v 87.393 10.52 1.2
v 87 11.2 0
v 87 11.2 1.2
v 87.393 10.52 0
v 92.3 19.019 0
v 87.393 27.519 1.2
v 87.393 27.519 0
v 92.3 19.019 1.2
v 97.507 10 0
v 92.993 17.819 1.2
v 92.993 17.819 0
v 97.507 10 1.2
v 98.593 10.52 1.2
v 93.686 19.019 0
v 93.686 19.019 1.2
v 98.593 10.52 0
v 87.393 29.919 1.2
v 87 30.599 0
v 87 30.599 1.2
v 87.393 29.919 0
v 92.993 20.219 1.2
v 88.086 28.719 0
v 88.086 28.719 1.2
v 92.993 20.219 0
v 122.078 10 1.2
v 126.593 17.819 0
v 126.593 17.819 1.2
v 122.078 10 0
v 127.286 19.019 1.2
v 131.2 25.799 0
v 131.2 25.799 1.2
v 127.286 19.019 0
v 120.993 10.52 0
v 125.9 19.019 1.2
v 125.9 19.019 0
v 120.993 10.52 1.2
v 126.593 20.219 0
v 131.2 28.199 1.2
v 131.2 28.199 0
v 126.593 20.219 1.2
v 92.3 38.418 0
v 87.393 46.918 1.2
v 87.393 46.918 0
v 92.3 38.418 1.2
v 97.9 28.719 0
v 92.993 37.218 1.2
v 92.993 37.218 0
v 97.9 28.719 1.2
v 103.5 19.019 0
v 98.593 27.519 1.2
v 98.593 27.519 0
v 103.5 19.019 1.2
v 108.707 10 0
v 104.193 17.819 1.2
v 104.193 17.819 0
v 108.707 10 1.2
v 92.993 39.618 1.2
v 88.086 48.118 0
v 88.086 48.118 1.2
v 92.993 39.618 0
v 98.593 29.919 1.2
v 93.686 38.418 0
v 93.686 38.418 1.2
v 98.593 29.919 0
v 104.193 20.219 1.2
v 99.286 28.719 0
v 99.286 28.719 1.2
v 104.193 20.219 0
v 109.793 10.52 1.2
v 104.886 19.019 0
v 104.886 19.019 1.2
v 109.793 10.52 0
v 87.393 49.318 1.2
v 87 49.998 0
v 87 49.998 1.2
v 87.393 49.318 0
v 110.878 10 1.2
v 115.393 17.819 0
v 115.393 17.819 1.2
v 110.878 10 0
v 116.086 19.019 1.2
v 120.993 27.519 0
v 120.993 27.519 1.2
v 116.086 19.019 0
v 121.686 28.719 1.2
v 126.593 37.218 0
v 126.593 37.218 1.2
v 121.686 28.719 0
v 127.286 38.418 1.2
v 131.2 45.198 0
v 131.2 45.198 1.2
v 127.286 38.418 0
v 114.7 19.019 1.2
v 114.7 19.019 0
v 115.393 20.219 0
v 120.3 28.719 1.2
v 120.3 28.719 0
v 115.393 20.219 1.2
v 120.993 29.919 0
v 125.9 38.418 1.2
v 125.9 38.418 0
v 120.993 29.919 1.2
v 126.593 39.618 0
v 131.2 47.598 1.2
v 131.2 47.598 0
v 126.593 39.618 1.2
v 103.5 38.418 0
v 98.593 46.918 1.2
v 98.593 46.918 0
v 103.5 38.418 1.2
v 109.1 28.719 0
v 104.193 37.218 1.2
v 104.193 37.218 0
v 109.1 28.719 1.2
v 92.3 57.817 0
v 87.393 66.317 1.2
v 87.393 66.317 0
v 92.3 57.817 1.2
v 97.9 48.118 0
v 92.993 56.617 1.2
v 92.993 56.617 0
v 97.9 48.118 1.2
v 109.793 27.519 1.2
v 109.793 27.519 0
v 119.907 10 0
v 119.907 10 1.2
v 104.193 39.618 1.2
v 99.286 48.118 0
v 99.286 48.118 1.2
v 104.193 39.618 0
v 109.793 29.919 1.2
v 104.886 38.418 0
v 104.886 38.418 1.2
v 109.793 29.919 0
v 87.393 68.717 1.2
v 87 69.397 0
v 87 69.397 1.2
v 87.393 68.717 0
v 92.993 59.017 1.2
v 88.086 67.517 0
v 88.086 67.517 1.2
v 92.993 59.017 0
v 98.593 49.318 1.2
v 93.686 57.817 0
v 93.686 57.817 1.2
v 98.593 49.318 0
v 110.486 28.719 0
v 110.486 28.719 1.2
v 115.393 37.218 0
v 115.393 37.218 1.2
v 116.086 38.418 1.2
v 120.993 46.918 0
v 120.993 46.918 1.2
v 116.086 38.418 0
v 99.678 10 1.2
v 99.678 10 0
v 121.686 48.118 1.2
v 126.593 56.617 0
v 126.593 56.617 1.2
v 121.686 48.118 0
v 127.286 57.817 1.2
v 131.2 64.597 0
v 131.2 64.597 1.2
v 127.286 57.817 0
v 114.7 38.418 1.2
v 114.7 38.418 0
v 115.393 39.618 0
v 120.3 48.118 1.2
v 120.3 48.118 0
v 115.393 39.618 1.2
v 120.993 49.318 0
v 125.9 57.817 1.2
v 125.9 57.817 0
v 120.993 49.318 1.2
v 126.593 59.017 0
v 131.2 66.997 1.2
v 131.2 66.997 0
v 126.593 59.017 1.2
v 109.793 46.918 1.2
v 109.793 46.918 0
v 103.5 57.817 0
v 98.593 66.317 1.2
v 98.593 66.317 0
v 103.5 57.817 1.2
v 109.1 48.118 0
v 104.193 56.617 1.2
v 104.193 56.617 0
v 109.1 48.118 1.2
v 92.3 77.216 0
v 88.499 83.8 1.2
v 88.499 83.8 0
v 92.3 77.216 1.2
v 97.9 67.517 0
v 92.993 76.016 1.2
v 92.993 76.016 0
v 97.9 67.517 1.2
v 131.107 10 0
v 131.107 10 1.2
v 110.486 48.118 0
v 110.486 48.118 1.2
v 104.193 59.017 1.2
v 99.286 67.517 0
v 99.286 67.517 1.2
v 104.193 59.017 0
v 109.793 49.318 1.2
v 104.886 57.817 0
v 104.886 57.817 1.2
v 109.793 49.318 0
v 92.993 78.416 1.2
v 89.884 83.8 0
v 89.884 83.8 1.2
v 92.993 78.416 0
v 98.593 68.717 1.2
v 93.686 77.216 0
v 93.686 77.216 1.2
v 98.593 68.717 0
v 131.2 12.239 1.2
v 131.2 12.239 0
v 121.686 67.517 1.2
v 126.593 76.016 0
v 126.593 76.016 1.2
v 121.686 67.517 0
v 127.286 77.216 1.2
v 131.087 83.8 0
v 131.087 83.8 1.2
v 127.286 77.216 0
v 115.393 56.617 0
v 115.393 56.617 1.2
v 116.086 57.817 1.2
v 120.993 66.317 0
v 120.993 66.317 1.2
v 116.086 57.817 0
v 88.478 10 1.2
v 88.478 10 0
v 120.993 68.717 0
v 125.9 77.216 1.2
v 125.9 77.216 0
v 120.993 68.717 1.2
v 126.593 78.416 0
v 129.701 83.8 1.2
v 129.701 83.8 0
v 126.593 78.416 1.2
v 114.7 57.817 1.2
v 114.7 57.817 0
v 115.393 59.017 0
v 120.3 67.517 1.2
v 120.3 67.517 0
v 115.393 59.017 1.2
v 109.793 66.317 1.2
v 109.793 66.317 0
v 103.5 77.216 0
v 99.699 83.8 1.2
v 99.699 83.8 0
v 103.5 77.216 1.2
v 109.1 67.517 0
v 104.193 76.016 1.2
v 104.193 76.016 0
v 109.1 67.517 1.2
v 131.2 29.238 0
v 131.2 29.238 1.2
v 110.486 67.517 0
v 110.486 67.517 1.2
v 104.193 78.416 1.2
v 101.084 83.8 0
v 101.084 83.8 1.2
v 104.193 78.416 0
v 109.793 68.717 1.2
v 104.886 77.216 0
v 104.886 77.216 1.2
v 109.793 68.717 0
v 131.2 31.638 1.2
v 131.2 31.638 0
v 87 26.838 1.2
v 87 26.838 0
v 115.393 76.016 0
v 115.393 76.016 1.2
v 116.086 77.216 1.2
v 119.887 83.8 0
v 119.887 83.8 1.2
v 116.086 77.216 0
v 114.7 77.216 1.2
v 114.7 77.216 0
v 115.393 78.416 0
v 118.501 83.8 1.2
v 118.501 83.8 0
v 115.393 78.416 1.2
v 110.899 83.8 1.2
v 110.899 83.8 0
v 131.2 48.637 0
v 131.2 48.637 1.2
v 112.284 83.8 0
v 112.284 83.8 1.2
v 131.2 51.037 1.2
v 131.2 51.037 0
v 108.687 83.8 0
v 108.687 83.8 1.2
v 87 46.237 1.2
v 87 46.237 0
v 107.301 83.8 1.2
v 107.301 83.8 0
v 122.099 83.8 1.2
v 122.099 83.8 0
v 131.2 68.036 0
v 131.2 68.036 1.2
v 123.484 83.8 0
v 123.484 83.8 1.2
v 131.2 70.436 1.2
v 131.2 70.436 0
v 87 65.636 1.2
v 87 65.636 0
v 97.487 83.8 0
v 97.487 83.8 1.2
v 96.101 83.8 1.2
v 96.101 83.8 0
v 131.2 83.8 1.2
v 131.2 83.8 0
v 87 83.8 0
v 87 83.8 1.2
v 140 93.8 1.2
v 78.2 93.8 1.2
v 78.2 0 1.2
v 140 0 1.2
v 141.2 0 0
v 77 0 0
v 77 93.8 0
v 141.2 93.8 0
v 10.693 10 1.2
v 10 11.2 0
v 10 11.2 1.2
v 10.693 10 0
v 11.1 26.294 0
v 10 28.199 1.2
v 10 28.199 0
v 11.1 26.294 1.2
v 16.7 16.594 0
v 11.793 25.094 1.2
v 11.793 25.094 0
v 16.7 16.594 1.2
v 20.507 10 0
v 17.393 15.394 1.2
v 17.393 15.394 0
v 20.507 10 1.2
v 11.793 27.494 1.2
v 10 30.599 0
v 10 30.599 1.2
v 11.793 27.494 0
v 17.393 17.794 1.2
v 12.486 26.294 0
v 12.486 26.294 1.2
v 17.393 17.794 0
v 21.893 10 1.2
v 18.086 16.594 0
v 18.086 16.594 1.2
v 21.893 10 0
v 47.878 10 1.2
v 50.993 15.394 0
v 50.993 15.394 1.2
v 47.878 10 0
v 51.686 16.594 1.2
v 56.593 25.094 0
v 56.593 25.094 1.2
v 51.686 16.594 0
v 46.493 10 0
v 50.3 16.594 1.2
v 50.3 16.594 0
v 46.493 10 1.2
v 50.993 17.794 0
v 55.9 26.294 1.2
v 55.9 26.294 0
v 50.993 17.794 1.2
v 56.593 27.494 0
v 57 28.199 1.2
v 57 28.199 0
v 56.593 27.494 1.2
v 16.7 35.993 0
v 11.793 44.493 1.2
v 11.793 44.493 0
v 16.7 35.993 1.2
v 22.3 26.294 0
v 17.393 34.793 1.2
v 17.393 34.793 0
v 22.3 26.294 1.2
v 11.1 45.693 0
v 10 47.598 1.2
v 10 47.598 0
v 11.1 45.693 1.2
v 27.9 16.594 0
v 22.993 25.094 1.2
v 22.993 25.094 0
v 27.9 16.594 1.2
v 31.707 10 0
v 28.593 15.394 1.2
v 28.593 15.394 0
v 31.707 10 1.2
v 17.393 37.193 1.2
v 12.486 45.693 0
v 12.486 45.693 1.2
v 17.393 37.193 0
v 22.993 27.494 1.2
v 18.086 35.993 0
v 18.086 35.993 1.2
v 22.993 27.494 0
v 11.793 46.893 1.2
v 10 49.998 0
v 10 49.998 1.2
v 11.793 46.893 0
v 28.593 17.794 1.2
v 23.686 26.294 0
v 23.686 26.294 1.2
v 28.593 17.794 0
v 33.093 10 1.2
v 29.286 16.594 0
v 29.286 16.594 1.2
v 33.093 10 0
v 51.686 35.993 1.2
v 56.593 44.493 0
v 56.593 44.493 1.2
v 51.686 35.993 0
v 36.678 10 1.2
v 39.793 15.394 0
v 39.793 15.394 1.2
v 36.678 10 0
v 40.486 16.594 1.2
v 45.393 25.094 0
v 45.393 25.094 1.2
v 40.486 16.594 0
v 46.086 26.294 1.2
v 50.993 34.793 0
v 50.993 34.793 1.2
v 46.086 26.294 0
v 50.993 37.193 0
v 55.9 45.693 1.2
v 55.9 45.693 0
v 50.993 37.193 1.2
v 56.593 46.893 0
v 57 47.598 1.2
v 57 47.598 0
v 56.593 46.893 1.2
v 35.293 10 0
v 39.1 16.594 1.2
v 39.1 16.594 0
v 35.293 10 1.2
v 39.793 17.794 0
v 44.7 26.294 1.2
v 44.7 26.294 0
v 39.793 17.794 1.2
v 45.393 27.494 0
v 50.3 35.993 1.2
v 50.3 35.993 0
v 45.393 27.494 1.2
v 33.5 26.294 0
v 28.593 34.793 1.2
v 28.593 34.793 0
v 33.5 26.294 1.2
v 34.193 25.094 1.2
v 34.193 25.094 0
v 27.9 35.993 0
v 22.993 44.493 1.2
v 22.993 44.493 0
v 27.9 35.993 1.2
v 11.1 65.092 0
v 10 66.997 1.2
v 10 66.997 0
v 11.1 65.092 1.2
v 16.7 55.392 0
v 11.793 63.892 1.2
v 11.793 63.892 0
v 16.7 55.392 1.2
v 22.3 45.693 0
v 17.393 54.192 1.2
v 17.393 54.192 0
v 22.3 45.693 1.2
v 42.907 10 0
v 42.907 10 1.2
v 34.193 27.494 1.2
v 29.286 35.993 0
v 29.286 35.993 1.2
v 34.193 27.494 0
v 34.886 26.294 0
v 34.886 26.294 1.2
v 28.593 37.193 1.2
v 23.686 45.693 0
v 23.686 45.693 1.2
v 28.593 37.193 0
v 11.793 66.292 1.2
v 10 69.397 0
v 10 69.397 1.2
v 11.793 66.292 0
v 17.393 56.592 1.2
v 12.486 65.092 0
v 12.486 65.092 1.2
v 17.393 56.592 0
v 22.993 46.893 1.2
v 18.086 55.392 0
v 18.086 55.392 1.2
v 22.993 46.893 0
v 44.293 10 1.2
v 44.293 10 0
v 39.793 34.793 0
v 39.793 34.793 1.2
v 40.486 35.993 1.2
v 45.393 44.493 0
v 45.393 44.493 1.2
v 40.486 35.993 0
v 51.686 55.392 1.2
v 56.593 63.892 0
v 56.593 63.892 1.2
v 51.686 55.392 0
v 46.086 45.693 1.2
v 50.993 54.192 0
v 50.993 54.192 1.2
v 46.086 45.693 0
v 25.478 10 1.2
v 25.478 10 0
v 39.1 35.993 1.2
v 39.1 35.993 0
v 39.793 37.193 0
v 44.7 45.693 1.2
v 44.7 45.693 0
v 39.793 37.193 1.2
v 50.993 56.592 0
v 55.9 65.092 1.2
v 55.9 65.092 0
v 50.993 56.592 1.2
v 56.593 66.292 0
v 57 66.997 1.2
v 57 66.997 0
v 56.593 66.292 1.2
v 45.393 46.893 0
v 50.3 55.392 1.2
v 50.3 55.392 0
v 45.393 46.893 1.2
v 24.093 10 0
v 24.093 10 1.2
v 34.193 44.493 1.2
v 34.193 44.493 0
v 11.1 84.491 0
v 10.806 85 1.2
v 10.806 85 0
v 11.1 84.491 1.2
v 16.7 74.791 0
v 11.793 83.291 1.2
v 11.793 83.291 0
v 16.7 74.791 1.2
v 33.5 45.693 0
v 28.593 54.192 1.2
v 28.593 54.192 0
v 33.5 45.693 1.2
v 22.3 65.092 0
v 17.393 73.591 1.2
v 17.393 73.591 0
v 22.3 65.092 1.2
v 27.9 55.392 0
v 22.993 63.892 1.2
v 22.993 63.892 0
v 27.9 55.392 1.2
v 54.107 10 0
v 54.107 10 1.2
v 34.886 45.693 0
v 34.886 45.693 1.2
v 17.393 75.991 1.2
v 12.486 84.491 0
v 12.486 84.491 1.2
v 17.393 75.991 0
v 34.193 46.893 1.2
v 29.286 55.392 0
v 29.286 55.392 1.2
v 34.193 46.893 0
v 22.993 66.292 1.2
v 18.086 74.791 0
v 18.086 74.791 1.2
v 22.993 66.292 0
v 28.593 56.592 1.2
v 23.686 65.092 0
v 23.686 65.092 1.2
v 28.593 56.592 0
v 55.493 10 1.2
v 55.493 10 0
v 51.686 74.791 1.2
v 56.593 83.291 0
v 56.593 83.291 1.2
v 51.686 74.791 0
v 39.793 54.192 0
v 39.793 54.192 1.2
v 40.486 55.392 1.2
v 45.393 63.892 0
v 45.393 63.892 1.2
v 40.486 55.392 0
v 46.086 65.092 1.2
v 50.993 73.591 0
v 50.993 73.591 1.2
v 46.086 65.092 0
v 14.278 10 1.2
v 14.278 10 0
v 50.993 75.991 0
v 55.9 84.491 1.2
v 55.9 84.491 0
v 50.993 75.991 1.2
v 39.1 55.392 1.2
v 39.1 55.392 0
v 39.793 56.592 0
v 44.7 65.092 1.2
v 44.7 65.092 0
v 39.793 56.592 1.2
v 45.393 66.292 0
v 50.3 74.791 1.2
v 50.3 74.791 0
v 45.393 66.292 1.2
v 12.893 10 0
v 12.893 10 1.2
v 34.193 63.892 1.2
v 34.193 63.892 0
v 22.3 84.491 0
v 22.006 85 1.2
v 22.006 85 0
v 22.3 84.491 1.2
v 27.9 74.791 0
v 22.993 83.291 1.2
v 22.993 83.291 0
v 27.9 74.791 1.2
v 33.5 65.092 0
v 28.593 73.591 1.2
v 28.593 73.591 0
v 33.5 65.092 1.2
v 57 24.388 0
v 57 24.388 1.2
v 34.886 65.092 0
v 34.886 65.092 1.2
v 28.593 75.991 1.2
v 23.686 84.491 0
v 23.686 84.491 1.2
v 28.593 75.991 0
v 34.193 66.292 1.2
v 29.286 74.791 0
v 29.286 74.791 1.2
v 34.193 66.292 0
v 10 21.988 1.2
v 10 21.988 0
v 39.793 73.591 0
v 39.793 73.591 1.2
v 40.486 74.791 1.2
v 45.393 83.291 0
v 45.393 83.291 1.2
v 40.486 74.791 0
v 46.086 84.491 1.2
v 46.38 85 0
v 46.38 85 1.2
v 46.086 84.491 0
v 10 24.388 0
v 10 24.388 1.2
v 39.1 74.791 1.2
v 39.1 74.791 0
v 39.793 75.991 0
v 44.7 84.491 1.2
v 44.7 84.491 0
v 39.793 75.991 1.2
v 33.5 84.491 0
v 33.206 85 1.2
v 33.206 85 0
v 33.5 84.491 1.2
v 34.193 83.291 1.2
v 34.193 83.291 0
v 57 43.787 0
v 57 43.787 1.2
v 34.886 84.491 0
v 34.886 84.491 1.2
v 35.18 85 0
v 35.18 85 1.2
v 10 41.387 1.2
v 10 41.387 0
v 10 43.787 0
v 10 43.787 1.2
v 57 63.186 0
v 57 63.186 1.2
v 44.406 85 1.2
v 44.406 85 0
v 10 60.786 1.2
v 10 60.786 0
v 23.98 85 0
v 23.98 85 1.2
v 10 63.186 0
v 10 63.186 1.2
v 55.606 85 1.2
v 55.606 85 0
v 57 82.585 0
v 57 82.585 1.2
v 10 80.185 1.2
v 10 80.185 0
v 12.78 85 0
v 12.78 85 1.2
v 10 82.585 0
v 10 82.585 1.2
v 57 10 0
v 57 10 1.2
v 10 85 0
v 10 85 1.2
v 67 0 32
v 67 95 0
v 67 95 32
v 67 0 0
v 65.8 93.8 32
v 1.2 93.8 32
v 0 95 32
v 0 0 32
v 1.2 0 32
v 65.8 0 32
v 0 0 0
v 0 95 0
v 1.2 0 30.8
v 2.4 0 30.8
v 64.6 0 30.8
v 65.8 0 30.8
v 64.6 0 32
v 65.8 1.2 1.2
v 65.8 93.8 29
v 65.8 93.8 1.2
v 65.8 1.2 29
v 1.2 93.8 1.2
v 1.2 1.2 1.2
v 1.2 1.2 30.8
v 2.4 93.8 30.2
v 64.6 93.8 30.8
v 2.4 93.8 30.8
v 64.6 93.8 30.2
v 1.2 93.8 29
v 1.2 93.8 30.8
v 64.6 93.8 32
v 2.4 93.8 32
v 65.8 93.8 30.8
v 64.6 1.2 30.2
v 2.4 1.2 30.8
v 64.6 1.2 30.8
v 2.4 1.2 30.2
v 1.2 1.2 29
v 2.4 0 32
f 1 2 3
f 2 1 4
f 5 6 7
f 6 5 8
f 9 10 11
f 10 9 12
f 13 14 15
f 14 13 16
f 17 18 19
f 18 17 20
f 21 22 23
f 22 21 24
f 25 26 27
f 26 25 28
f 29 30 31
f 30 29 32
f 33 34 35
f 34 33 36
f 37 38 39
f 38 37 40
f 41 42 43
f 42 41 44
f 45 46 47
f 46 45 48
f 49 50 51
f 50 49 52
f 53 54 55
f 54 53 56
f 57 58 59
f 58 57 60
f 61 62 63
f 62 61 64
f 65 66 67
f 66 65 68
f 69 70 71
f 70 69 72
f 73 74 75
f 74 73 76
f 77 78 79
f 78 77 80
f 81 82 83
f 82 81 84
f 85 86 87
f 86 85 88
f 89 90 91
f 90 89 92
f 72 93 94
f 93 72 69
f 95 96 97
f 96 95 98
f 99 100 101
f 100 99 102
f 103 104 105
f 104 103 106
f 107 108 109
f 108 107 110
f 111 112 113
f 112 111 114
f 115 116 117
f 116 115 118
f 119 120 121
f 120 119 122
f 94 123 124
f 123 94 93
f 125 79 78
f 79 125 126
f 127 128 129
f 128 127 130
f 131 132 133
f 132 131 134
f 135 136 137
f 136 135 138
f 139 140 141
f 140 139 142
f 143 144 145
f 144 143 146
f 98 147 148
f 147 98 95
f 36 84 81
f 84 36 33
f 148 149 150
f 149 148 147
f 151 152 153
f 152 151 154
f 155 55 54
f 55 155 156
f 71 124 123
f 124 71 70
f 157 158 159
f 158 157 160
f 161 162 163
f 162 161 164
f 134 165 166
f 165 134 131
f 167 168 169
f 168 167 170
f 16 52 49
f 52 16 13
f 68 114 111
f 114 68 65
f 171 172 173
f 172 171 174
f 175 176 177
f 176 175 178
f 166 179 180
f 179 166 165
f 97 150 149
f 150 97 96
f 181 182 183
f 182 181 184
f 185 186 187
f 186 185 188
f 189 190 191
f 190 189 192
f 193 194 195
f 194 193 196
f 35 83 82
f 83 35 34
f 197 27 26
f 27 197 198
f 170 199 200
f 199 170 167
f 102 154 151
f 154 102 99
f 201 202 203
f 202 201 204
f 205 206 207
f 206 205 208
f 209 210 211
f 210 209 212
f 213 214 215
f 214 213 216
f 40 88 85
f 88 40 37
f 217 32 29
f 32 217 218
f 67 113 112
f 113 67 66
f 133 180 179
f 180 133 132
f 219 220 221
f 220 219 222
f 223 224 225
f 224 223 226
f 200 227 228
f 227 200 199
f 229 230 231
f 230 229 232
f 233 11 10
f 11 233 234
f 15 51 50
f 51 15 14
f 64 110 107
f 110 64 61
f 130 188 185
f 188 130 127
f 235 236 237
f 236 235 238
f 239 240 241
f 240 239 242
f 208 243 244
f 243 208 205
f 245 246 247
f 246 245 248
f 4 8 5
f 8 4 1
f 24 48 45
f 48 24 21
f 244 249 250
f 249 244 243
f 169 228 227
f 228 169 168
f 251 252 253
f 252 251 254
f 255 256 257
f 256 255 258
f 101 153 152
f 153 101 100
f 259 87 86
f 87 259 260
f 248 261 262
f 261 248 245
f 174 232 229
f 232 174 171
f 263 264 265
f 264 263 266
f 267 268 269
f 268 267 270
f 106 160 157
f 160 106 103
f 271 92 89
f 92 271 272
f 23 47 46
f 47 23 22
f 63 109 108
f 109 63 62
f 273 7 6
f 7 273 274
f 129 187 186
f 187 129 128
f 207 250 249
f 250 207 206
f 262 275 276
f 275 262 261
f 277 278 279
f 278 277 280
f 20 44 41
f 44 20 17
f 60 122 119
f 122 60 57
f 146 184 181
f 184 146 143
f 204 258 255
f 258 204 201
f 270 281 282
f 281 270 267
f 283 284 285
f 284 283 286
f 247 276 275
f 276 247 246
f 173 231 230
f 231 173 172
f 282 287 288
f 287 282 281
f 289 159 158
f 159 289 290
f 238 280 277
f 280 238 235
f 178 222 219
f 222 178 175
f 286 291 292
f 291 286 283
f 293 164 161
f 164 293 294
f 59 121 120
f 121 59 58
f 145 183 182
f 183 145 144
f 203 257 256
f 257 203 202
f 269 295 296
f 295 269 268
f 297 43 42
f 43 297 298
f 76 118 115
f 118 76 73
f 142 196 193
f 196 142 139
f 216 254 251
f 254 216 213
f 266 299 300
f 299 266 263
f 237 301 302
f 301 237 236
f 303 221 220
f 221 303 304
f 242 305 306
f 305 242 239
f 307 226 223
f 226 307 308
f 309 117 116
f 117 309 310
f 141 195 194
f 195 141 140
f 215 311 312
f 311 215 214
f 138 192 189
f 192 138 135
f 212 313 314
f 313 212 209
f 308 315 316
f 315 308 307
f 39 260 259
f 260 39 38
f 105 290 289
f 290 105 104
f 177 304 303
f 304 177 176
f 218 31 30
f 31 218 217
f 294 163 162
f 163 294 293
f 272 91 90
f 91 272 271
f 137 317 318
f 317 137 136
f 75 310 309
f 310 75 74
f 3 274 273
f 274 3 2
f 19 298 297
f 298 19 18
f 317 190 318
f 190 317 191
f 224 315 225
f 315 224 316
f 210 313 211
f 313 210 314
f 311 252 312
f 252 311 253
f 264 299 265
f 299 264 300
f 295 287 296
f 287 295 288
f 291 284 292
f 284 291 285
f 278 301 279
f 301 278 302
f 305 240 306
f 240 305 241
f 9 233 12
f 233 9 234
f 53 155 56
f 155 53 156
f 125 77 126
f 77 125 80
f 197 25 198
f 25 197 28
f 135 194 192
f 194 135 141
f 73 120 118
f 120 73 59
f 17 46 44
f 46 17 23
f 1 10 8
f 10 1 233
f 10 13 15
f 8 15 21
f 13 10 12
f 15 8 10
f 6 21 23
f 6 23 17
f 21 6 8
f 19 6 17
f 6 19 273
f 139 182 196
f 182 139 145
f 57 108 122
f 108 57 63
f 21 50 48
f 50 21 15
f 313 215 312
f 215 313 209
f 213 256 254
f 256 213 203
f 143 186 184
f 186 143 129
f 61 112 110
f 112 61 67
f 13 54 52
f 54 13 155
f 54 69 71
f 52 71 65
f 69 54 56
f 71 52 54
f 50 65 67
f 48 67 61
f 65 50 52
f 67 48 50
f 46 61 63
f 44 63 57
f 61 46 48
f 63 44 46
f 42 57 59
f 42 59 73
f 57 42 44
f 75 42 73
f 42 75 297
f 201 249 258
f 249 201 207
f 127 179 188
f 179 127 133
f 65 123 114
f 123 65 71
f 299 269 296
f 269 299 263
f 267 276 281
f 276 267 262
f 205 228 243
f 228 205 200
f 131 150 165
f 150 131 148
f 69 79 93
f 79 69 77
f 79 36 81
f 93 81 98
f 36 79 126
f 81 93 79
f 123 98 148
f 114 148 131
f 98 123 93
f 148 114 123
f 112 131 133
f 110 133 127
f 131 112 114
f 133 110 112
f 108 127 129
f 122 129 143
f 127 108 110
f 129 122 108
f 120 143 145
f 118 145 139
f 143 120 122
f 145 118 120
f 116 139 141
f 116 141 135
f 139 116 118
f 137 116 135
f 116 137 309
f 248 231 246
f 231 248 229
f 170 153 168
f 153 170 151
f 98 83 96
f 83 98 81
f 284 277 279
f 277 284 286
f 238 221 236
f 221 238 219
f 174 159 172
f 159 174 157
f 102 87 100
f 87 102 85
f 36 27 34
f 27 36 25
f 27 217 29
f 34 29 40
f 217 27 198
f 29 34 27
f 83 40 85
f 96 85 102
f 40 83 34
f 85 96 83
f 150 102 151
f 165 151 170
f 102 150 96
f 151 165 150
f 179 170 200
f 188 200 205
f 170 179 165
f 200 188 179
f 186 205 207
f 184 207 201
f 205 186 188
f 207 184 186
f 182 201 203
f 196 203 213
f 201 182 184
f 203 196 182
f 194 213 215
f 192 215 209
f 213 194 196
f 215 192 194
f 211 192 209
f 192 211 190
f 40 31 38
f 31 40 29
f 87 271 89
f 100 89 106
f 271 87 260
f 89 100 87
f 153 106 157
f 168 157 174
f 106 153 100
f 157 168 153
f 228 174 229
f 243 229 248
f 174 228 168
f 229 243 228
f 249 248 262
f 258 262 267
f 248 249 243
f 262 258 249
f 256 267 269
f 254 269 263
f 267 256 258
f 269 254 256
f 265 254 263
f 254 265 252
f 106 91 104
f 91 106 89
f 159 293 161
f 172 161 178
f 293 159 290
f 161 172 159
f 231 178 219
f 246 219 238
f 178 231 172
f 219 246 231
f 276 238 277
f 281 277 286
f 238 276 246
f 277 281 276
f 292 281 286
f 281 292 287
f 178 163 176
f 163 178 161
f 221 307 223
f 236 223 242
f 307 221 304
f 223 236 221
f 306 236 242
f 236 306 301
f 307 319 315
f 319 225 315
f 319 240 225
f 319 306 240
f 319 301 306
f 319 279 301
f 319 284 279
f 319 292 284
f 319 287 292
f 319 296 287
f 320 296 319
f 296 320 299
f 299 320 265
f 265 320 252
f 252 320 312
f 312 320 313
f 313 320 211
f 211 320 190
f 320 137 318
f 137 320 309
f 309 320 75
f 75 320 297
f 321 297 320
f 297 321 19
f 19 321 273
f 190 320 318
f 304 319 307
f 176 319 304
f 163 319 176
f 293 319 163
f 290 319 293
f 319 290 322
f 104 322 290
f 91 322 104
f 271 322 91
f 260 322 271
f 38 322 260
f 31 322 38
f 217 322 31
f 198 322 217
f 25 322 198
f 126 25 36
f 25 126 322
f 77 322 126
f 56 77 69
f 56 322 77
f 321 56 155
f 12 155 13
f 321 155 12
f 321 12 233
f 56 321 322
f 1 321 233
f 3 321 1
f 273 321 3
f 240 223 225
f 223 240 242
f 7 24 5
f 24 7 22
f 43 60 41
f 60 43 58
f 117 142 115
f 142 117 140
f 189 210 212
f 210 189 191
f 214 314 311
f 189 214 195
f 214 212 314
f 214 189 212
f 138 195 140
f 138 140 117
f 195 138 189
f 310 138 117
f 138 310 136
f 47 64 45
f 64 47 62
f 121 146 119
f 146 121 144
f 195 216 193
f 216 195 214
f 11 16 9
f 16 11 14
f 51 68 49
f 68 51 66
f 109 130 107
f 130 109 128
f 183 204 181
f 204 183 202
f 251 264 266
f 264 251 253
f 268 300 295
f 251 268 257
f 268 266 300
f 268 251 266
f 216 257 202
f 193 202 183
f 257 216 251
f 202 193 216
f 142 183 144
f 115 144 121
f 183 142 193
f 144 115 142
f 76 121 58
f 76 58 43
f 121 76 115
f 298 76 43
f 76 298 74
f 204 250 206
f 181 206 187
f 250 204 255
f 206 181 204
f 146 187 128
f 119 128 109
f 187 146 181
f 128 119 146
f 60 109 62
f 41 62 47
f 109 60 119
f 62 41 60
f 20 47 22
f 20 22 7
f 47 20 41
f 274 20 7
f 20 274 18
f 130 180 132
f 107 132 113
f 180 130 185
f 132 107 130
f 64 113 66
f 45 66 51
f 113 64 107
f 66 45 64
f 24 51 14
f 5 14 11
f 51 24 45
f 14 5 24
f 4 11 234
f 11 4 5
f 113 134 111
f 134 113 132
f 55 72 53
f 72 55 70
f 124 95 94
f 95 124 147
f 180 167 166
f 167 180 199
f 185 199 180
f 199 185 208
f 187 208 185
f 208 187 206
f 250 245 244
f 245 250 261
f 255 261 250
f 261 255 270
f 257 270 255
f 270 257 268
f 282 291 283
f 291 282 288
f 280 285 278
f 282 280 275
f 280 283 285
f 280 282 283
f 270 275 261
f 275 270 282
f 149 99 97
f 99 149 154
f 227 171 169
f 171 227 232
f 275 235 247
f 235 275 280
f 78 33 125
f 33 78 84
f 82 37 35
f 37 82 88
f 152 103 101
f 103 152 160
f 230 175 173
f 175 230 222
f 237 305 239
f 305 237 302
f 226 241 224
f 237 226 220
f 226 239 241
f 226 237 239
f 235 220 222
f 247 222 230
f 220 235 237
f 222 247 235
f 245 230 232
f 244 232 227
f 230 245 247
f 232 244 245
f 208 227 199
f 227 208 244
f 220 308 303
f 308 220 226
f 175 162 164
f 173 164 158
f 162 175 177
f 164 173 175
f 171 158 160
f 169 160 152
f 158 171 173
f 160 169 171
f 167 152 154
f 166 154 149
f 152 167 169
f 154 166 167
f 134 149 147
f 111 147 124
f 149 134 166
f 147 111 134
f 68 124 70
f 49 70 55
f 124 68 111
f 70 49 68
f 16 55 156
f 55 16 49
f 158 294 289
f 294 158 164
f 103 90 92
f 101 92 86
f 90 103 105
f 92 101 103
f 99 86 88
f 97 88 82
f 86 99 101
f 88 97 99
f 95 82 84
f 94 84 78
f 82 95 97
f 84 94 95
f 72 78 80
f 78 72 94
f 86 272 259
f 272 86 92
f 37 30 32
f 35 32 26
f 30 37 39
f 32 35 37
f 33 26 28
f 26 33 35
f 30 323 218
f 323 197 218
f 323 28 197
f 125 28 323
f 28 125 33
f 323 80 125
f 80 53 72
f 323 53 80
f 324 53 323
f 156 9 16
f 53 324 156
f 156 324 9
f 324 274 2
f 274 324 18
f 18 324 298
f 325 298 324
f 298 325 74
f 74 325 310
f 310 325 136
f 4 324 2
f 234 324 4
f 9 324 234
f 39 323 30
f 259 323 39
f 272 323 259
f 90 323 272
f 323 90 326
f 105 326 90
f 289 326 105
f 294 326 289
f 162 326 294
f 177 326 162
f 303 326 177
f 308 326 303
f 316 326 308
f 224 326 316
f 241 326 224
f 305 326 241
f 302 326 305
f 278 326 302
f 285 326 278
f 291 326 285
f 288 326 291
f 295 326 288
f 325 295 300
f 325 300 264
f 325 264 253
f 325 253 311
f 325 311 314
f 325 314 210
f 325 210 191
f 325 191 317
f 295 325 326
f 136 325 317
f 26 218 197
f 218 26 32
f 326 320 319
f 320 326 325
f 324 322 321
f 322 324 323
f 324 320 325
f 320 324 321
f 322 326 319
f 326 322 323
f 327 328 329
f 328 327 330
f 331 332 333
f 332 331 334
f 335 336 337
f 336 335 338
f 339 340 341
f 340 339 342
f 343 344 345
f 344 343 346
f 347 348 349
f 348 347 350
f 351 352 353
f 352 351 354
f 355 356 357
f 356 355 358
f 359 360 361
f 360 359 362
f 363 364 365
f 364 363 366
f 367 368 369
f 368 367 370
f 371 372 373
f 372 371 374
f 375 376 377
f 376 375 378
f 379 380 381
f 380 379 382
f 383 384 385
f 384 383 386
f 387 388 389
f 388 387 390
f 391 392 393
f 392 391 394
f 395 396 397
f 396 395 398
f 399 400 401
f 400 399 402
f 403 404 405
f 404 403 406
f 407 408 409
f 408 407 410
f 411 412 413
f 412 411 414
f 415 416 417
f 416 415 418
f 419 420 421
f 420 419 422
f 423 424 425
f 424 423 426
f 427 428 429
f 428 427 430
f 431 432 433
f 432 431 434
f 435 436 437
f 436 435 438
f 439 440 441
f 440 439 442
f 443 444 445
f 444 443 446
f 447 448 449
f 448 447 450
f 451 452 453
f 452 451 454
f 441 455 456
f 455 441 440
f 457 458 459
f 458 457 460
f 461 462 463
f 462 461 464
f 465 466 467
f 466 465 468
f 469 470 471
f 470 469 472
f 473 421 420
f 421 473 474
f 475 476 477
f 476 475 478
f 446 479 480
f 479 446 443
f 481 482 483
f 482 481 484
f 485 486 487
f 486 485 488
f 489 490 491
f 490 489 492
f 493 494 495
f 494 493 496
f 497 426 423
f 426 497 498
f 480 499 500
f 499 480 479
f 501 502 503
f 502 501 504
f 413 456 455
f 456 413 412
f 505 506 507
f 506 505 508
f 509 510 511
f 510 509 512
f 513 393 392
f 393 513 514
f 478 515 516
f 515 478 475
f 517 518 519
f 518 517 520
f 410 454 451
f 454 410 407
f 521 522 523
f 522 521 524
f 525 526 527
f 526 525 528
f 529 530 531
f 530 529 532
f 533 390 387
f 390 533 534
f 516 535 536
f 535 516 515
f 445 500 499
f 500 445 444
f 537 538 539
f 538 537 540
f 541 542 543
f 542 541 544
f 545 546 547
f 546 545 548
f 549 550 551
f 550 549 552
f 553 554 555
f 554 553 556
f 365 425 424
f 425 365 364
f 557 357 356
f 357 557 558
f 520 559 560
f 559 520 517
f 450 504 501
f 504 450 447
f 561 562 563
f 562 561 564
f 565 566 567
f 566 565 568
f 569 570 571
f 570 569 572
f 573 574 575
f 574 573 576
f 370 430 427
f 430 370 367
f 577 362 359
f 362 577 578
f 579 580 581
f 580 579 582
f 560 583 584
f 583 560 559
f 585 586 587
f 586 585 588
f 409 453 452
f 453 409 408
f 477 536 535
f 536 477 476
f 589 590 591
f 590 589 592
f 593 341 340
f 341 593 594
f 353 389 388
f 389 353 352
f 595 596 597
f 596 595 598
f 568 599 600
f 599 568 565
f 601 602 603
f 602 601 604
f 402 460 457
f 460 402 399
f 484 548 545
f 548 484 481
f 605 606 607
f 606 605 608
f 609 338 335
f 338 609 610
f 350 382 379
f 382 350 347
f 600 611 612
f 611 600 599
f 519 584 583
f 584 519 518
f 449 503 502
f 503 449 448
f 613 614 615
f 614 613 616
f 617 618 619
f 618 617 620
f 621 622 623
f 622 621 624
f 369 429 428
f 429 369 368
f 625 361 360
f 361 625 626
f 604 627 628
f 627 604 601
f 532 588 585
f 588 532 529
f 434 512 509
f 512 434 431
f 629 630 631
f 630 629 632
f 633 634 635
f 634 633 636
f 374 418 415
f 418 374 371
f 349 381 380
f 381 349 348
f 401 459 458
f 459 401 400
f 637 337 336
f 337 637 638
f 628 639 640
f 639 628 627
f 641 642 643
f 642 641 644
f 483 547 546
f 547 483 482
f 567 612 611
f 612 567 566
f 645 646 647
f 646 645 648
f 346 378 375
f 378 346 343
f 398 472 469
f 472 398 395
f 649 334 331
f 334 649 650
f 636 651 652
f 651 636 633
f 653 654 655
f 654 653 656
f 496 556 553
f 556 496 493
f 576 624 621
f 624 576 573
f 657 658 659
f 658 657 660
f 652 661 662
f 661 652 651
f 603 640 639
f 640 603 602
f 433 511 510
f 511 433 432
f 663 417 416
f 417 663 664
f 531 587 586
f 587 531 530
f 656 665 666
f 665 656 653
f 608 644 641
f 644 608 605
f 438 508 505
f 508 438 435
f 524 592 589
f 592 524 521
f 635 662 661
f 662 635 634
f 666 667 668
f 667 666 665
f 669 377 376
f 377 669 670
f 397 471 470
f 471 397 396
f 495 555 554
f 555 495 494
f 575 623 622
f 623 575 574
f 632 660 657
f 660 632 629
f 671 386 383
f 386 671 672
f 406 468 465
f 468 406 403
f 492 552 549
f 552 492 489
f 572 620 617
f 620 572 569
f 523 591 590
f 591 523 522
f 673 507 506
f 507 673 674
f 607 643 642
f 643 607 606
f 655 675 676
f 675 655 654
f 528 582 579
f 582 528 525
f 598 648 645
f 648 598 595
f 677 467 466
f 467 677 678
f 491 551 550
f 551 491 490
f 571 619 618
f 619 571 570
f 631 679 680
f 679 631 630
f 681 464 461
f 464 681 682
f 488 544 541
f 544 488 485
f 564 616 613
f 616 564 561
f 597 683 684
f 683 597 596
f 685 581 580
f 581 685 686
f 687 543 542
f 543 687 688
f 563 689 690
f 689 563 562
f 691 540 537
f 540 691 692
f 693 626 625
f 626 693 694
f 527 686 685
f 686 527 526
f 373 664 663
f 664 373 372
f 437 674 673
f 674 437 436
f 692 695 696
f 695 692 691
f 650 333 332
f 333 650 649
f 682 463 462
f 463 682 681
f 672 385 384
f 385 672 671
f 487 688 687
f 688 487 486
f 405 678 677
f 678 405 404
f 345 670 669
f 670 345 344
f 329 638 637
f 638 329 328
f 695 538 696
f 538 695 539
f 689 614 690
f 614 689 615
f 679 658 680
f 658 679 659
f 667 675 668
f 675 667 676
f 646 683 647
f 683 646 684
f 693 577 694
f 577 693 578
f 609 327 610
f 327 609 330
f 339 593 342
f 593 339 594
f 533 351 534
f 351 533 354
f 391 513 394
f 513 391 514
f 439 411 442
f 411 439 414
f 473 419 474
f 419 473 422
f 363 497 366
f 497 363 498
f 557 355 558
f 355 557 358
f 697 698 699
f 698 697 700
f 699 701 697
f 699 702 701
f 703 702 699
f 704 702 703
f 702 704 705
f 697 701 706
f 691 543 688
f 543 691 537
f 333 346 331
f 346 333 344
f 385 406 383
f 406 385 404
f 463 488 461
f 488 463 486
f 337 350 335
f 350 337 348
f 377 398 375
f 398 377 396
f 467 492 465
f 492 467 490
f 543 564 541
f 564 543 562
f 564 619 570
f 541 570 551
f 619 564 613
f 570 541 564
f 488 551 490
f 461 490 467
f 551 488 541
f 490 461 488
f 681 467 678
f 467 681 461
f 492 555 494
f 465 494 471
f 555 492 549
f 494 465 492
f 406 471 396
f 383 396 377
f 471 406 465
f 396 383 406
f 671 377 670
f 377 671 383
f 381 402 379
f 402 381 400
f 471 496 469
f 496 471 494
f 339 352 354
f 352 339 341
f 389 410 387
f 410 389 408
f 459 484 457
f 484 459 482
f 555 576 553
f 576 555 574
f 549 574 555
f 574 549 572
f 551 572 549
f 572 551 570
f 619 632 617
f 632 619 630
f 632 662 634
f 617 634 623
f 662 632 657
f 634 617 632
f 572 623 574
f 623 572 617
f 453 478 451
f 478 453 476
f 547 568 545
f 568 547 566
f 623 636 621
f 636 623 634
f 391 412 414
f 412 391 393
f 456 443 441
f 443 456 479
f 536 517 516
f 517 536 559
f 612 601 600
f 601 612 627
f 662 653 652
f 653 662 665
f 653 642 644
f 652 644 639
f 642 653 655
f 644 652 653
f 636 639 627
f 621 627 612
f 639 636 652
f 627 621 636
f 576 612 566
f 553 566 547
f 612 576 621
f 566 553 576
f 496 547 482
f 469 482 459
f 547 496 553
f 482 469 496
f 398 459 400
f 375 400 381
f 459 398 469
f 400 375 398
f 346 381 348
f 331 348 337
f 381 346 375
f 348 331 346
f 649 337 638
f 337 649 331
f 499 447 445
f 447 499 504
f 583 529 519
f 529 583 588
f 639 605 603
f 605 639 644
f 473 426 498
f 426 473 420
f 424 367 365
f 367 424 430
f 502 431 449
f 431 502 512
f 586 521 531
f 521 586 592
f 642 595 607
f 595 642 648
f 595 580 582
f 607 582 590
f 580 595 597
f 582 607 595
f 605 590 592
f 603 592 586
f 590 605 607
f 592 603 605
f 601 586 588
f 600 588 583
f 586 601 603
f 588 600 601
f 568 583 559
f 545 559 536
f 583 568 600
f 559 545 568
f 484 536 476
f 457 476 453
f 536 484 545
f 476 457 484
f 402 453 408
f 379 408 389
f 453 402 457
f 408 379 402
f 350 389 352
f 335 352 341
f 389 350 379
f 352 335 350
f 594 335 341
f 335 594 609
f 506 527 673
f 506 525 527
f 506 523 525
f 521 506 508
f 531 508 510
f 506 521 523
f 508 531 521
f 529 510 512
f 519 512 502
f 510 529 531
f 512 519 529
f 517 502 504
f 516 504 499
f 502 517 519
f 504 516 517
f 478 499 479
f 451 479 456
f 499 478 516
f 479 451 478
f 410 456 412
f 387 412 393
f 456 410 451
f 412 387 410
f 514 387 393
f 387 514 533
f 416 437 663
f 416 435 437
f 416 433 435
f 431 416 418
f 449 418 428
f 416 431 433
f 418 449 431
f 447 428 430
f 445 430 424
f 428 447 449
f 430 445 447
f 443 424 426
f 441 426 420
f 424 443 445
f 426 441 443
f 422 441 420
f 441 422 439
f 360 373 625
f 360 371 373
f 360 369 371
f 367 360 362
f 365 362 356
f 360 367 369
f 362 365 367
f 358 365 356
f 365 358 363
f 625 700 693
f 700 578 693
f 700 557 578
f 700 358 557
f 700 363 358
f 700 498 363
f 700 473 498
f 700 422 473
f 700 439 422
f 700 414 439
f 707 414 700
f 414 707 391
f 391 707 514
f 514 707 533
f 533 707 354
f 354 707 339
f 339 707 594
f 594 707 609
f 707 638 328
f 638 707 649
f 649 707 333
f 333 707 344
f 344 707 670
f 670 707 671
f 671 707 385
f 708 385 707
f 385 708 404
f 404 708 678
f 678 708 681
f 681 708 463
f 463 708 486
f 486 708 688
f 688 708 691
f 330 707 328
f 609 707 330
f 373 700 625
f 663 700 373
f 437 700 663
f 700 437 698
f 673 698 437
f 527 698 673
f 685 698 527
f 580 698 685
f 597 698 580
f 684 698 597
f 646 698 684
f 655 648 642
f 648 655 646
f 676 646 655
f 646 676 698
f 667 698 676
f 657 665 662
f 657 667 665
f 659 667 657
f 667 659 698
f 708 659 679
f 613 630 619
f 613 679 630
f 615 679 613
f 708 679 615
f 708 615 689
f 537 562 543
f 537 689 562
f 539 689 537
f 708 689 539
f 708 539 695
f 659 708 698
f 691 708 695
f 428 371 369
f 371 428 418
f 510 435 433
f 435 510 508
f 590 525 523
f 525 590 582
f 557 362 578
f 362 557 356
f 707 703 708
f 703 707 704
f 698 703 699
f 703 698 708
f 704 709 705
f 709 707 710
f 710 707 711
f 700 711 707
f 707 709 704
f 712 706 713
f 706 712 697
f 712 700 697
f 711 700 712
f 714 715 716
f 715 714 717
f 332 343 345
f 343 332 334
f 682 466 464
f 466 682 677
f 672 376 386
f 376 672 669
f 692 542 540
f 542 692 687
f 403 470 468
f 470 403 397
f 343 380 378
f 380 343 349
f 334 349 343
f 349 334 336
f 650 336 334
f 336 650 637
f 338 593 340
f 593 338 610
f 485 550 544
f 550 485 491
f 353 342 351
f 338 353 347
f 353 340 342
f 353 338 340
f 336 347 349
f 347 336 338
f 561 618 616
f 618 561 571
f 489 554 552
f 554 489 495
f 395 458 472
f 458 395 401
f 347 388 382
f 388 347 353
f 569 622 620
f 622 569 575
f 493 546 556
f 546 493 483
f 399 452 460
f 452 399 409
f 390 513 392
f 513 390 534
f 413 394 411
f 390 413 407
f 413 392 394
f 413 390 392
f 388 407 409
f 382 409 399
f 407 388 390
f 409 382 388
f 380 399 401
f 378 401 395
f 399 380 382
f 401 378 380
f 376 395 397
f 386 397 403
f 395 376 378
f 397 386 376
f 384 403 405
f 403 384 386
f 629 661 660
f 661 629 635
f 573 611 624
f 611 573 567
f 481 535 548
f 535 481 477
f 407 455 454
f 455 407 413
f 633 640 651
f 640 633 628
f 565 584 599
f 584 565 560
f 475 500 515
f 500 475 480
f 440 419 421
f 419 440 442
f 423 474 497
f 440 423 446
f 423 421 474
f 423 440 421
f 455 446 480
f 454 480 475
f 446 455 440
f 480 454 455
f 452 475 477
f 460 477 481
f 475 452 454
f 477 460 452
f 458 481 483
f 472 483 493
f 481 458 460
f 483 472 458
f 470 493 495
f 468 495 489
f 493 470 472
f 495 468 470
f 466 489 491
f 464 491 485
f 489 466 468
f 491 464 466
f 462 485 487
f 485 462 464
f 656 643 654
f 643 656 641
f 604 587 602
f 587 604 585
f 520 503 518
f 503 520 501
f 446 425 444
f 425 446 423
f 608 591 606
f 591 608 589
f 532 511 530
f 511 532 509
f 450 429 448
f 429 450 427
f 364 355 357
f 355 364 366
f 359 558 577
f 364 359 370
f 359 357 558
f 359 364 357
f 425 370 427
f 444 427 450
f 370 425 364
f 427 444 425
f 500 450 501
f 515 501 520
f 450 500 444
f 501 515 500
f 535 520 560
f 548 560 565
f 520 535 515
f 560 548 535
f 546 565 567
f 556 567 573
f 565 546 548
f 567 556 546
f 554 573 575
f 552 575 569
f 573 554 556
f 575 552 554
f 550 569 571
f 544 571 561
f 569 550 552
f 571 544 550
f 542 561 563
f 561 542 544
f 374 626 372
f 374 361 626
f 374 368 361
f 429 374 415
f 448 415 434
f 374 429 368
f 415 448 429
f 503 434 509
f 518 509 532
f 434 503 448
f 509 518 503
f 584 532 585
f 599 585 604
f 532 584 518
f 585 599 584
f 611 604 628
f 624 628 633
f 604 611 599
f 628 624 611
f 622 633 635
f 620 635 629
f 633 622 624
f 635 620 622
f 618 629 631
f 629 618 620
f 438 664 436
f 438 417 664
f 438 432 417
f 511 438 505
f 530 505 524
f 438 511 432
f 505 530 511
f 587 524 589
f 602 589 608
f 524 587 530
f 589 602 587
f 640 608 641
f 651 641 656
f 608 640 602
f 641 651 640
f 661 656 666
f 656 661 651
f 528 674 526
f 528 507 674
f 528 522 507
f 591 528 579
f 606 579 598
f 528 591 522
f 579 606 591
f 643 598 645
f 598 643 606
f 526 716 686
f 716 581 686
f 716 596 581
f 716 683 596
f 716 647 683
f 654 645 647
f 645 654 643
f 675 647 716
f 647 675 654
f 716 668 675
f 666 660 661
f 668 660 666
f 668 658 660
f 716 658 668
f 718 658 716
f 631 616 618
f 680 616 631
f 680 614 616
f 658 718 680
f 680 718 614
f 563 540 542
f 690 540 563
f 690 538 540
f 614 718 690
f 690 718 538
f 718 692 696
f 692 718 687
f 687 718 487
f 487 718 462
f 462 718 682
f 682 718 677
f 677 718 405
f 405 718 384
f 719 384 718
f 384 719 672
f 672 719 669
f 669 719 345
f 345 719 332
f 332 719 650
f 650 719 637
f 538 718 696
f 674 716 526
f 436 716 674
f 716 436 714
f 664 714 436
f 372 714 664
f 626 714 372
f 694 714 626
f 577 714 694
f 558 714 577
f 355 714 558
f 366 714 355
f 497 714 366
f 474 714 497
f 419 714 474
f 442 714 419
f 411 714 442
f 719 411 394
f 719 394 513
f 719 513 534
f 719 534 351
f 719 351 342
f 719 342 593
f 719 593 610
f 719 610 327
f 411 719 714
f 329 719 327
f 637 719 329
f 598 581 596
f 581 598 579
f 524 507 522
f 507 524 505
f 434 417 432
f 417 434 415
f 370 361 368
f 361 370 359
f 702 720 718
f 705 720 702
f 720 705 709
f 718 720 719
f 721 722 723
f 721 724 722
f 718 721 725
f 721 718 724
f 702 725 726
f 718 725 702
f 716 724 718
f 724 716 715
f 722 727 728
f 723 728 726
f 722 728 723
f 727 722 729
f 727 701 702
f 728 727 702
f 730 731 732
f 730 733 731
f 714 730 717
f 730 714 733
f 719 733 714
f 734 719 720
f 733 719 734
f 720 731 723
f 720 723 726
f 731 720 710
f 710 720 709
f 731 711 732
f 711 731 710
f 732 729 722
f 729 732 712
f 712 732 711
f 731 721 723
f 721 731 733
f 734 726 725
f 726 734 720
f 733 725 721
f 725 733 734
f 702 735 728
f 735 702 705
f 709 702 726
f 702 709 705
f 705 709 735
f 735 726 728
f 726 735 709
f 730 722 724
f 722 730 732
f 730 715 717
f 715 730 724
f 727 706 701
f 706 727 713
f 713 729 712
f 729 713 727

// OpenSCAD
// file: hashedSquare.scad
module hashedSquare(x, y, z = 1.2, space = 7) {
    angle = 30;
	steps = space + z;

	count = round((x + y) / steps) + 1;

    difference() {
        cube([x, y, z *3]);

		for (i = [0: 1: count]) {
			translate([i * steps, -z, 0])
				rotate([0, 0, angle])
					cube([z, y / cos(angle) + z *2, z *3]);
			translate([x - i * steps, -z, 0])
				rotate([0, 0, -angle])
					cube([z, y / cos(angle) + z *2, z *3]);
		}
    }
}
// file: touchGap.scad
module touchGap(width, height, material = 1.2) {
	translate([0, 0, -height]) {
		cube (size = [material *3, width, height]);
	
	translate([0, width /2, 0])
		rotate([0, 90, 0]) 
			cylinder(h = material *3, d = width);
	}
}
// file: box.scad
include <touchGap.scad>;
include <hashedSquare.scad>;

module box(x = 0.0, y = 0.0, z = 0.0, material = 1.2, touchGaps = [false, false, false, false], eco = [false, false, false, false, true], hashSpace = 7) {
	echo("######### BOX size X = ", x, ", Y = ", y, ", Z = ", z, " #########");

	tempX = x * 0.6 ;
	tempY = y * 0.6;
		
	xDiameter = tempX > 40.0 ? 40.0 : tempX;
	yDiameter = tempY > 40.0 ? 40.0 : tempY;
	
	difference() {
		cube(size = [x, y, z]);
		
		translate([material, material, material]) {
			//cube(size = [x - (material * 2), y - (material * 2), z - material]);
			if (z > material)
				cube(size = [x - (material * 2), y - (material * 2), z]);
			if (z <= material)
				cube(size = [x - (material * 2), y - (material * 2), z - material]);
		}
		
		if (touchGaps[0]) //front
			translate([xDiameter + (x - xDiameter) /2, -material, z  + 0.1])
				rotate([0,0,90])
					touchGap(width = xDiameter, height = xDiameter * 0.5, material = material);

		if (touchGaps[1]) //left
			translate([0, (y - yDiameter) /2, z])
				touchGap(width = yDiameter, height = yDiameter * 0.5, material = material);

		if (touchGaps[2]) //back
			translate([xDiameter + (x - xDiameter) /2, y - material *2, z + 0.1])
				rotate([0,0,90])
					touchGap(width = xDiameter, height = xDiameter * 0.5, material = material);

		if (touchGaps[3]) //right
			translate([x - material * 2, (y - yDiameter) /2, z])
				touchGap(width = yDiameter, height = yDiameter * 0.5, material = material);
		
		ecoDistance = 10;
		ecoX = x - ecoDistance * 2;
		ecoY = y - ecoDistance * 2;
		
		frontY = touchGaps[0] ? z - xDiameter - ecoDistance * 2: z - ecoDistance * 2;
		leftY = touchGaps[1] ? z - xDiameter - ecoDistance * 2: z - ecoDistance * 2;
		backY = touchGaps[2] ? z - xDiameter - ecoDistance * 2: z - ecoDistance * 2;
		rightY = touchGaps[3] ? z - xDiameter - ecoDistance * 2: z - ecoDistance * 2;
		
		if (eco) {
			sideWidth = y - ecoDistance * 2;
			sideHeight = z - ecoDistance * 2;

			//front
			if (eco[0])
				translate([ecoDistance, material *2, ecoDistance])
					rotate([90, 0, 0])
						hashedSquare(x = ecoX, y = frontY, z = material, space = hashSpace);

			//left
			if (eco[1])
				translate([0, ecoDistance, ecoDistance])
					rotate([90, 0, 90])
						hashedSquare(x = ecoY, y = leftY, z = material, space = hashSpace);

			//back
			if (eco[2])
				translate([ecoDistance, y + material, ecoDistance])
					rotate([90, 0, 0])
						hashedSquare(x = ecoX, y = backY, z = material, space = hashSpace);

			//right
			if (eco[3])
				translate([x - material *2, ecoDistance, ecoDistance])
					rotate([90, 0, 90])
						hashedSquare(x = ecoY, y = rightY, z = material, space = hashSpace);

			//bottom
			if (eco[4])
				translate([ecoDistance, ecoDistance, -0.1])
					hashedSquare(x = x - ecoDistance * 2, y = y - ecoDistance * 2, z = material, space = hashSpace);
		}
	}
}

// x = 100;
// y = 100;
// z = 100;

// x = 73;
// y = 65;
// z = 95;

// box(v = [x, y , z], touchGaps = [true, false, true, false], eco = [true, true, true, true, true]);

// translate([x + 30, 0, 0])
// 	box(v = [x, y , z], touchGaps = [false, false, false, false], eco = [true, true, true, true, true]);
// file: cube+Support.scad
module cubeLeftSupported(y = 0.0, z = 1.2, angle = 45, material = 1.2) {
	x = material;
	difference() {
		cube(size = [x, y, z]);
			translate(v = [0, -material, 0])
				rotate(a = [0, angle, 0])
					cube(size = [x, y + material * 2, material * 2]);
	}
}

module cubeRightSupported(y = 0.0, z = 1.2, angle = 45, material = 1.2) {
	translate(v = [material, y, 0]) 
		rotate(a = [0, 0, 180])
			cubeLeftSupported(y = y, z = z, angle = angle, material = material);
}

// material = 1.2;
// y = 37;
// z = 35;

// cubeLeftSupported(angle = 45, y = y, z = z, material = material);

// translate(v = [15, 0 , 0]) 
// 	cubeRightSupported(angle = 45, y = y, z = z, material = material);
// main file
//include <hashedSquare.scad>;
include <cube+Support.scad>
include <box.scad>;

module boxWithLid(x = 0.0, y = 0.0, z = 0.0, material = 1.2, eco = [false, false, false, false, true, true], hashSpace = 7, toleranceSpace = 0.2) {
	// eco[0] = front	// eco[1] = left	// eco[2] = back	// eco[3] = right	// eco[4] = bottom	// eco[5] = lid

	translate(v = [x + 10, 0 , 0])
		lid(x = x - toleranceSpace * 2, y = y, z = z, hashSpace = hashSpace);
	
	difference() {
		box(x = x, y = y, z = z, material = material, eco = eco, hashSpace = hashSpace);
		translate(v = [material, -material, z - material])
			cube(size = [x - material *2, material * 3, material * 2]);
	}
	
	translate(v = [material, 0, z - material * 2.5])
		cubeLeftSupported(y = y, z = material * 1.5);
	translate(v = [material, 0, z - material])
		cubeLeftSupported(y = y, z = material);
	
	translate(v = [x - material * 2, 0, z- material * 2.5])
		cubeRightSupported(y = y, z = material * 1.5);
	translate(v = [x - material * 2, 0, z - material])
		cubeRightSupported(y = y, z = material);
	
	//todo: wölbung am hinteren teil des einschubes, damit der deckel nicht raus rutscht
	
}

module lid(x = 0.0, y = 0.0, z = 0.0, material = 1.2, eco = [false, false, false, false, true, true], hashSpace = 7) {
	//translate([x + 20 + material, material, 0]){
	lidX = x - material * 2;
	lidY = y - material;
	
	difference() {
		box(x = lidX, y = lidY, z = material, eco = [eco[0], eco[1], eco[2], eco[3], eco[5]], hashSpace = hashSpace);
		//translate(v = [0, -material, material * 0.5])
		translate(v = [0, -material, 0])
			rotate(a = [0, -45, 0])
				cube(size = [material * 2, lidY + material * 2, material]);
		//translate(v = [lidX, -material, material * 0.5])
		translate(v = [lidX, -material, 0])
			rotate(a = [0, -45, 0])
				cube(size = [material, lidY + material * 2, material * 2]);
	}
}

// x = 100;
// y = 100;
// z = 100;

// x = 73;
// y = 65;
// z = 95;

x = 67;
y = 95;
z = 32;

boxWithLid(x = x, y = y, z = z, hashSpace = 10);
